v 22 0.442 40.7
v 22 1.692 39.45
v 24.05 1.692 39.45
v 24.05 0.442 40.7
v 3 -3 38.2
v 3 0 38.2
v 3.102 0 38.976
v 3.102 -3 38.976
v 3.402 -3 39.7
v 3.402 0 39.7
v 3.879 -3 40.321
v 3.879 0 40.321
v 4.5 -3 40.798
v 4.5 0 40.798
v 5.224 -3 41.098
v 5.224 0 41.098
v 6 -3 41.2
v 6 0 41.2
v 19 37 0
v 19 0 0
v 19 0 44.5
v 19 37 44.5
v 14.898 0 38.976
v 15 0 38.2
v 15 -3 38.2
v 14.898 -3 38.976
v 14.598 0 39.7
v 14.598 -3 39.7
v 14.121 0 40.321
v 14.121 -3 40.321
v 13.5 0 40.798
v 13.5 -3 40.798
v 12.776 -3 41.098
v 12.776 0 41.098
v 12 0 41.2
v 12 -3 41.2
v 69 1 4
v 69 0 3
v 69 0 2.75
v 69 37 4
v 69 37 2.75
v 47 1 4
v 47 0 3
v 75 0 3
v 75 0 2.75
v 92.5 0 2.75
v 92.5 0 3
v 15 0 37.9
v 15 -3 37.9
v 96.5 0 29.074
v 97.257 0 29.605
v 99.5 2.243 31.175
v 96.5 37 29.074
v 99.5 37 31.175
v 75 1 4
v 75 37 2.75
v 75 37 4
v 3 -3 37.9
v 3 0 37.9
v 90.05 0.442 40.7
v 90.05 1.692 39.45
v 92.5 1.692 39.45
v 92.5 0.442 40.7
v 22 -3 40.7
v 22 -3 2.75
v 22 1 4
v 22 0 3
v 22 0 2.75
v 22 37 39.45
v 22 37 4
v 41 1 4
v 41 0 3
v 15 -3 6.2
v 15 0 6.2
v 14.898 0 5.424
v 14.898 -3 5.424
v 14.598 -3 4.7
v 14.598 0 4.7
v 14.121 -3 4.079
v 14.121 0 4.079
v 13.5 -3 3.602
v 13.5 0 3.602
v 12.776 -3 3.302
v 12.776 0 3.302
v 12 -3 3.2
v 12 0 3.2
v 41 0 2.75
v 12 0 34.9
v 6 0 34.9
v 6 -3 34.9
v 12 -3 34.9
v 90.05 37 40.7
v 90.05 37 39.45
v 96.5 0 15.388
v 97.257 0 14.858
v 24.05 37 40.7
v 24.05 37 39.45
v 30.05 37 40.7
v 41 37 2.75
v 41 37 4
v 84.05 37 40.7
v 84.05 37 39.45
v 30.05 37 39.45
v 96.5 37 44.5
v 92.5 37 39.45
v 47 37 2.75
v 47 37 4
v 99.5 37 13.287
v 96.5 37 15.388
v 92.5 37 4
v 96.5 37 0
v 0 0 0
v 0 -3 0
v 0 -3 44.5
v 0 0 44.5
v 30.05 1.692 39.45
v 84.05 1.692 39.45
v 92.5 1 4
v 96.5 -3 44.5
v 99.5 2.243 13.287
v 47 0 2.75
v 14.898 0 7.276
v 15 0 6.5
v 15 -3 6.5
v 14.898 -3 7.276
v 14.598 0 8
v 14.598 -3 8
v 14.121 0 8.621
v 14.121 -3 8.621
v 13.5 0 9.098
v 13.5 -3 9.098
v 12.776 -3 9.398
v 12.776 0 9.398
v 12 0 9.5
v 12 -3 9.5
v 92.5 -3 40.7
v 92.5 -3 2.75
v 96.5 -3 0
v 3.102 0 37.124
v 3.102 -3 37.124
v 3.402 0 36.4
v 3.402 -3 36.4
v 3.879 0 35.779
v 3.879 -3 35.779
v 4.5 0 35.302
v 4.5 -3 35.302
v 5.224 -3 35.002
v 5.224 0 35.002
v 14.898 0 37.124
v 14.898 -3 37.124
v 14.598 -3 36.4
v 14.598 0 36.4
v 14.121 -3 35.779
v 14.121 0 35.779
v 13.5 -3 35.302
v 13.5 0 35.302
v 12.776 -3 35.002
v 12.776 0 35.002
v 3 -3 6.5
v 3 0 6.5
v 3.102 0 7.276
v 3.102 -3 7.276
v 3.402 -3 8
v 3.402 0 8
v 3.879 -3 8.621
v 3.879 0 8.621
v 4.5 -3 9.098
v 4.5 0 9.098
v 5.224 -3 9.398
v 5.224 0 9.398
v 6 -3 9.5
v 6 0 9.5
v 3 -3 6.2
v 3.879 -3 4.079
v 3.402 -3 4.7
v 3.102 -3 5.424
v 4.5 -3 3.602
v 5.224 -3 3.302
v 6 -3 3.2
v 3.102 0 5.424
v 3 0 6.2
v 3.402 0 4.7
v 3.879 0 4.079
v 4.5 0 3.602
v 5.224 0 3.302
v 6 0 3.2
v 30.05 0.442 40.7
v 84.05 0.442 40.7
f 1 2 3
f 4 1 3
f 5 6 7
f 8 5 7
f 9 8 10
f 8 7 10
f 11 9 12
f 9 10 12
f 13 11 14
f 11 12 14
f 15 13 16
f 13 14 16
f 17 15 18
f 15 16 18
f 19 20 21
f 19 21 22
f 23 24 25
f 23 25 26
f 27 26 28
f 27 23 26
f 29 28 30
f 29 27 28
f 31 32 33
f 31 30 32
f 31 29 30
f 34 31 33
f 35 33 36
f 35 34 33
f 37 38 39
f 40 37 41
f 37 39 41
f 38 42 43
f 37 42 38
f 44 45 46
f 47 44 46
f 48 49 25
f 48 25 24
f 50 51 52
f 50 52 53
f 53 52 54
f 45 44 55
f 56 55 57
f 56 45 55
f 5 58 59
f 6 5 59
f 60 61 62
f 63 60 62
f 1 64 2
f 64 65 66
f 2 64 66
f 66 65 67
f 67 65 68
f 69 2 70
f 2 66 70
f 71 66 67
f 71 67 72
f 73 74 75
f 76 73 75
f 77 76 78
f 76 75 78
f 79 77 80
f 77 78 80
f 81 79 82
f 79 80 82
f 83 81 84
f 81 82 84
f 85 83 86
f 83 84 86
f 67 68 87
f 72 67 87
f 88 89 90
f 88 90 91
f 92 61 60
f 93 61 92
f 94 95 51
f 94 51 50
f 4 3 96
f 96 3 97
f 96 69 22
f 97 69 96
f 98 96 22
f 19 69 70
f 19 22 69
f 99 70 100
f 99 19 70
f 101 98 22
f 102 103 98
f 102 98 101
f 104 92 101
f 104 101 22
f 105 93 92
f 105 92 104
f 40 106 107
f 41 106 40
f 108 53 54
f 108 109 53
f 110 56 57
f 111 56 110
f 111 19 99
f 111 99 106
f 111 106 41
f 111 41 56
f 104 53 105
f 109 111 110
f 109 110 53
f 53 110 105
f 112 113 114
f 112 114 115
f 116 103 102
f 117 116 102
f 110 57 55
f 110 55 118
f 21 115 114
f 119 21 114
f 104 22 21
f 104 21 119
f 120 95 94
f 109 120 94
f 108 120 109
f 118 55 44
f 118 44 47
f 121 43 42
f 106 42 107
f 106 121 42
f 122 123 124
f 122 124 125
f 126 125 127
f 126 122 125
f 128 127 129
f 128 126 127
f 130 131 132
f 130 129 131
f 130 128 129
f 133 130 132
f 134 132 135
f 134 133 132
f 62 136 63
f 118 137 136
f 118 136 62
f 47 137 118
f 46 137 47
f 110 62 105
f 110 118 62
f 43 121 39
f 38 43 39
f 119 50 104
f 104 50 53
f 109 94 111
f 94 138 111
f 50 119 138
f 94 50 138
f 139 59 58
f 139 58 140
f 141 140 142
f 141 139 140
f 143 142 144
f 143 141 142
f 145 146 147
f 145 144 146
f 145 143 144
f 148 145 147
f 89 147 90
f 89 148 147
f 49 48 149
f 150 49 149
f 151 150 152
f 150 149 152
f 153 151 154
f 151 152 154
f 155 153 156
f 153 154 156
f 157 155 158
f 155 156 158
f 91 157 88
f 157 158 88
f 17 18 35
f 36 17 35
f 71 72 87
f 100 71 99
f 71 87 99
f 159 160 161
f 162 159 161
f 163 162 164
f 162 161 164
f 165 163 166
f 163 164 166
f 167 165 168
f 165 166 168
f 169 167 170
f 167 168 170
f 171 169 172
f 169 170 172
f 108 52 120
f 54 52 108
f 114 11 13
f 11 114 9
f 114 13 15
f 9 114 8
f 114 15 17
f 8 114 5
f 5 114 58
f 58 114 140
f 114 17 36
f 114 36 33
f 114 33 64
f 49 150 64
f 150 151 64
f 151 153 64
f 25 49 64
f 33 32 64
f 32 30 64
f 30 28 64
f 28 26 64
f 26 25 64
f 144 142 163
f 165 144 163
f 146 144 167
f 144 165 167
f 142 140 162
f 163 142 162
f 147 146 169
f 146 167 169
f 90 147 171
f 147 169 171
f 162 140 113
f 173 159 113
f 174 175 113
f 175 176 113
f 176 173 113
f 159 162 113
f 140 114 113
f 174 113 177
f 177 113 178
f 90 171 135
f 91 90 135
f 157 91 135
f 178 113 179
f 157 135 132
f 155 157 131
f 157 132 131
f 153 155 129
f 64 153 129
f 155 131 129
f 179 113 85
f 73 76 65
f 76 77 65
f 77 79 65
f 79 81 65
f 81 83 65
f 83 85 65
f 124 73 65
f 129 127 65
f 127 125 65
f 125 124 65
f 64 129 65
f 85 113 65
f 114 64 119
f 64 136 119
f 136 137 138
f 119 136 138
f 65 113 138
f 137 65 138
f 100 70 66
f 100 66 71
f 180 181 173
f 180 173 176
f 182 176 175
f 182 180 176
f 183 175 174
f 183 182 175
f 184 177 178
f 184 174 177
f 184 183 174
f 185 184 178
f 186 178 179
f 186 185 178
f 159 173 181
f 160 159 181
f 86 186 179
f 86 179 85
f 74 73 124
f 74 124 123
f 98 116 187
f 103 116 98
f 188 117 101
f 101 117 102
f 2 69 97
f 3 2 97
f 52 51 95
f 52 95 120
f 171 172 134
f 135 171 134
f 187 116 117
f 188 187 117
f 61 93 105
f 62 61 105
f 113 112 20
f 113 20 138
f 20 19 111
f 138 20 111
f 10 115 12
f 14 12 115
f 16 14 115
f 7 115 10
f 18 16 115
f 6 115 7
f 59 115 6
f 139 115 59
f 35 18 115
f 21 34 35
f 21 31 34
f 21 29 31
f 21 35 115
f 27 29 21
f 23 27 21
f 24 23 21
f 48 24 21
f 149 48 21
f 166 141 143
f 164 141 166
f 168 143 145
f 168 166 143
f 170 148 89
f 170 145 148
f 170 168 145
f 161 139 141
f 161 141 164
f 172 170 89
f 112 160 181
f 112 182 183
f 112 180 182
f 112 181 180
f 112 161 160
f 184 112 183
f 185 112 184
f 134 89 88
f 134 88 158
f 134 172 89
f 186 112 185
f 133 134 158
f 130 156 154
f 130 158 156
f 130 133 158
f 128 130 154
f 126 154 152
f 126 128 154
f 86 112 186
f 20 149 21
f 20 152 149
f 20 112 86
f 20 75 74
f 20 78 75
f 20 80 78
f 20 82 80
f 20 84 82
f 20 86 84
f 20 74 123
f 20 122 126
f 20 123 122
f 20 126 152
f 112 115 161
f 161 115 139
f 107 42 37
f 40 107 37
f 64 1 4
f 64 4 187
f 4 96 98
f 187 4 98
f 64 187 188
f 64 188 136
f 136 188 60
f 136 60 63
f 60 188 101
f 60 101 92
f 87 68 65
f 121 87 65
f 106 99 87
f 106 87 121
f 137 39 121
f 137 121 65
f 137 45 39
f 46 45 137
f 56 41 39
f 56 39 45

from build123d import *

# Parameters (mm, degrees)
BOX027_W               = 71
BOX027_H               = 10
BOX027_DEPTH           = 10
BOX027_PLACEMENT_ANGLE = 45
BOX022_W               = 22
BOX022_H               = 37
BOX022_DEPTH           = 4
BOX023_W               = 18
BOX023_H               = 37
BOX023_DEPTH           = 4
BOX021_W               = 19
BOX021_H               = 37
BOX021_DEPTH           = 4
BOX028_W               = 80
BOX028_H               = 10
BOX028_DEPTH           = 10
BOX028_PLACEMENT_ANGLE = 315
BOX025_W               = 3
BOX025_H               = 37
BOX025_DEPTH           = 4
BOX026_W               = 4
BOX026_H               = 37
BOX026_DEPTH           = 4
BOX024_W               = 54
BOX024_H               = 37
BOX024_DEPTH           = 4
BOX019_W               = 12
BOX019_H               = 10
BOX019_DEPTH           = 6.3
FILLET_R               = 3
BOX020_W               = 12
BOX020_H               = 10
BOX020_DEPTH           = 6.3
FILLET001_R            = 3
BOX018_W               = 19
BOX018_H               = 37
BOX018_DEPTH           = 45
BOX017_W               = 70.5
BOX017_H               = 45
BOX017_DEPTH           = 37.95
BOX016_W               = 96.5
BOX016_H               = 40
BOX016_DEPTH           = 44.5
BOX013_W               = 3
BOX013_H               = 37
BOX013_DEPTH           = 17.92
BOX013_PLACEMENT_ANGLE = 45
BOX014_W               = 3
BOX014_H               = 37
BOX014_DEPTH           = 17.92
BOX014_PLACEMENT_ANGLE = 55
BOX015_W               = 3
BOX015_H               = 37
BOX015_DEPTH           = 17.92
BOX015_PLACEMENT_ANGLE = 125
BOX012_W               = 3
BOX012_H               = 37
BOX012_DEPTH           = 17.92
CUT007_PLACEMENT_ANGLE = 180


with BuildPart() as cube027:
    # Box027 → Box027 (new body)
    with BuildSketch(Plane.XY):
        with Locations((35.5, 5)):
            Rectangle(BOX027_W, BOX027_H)
    extrude(amount=BOX027_DEPTH)


with BuildPart() as cube027_1:
    # Box027 placement: moved
    add(cube027.part.moved(Location((22, -3, 0))).rotate(Axis((22, -3, 0), (1, 0, 0)), BOX027_PLACEMENT_ANGLE))


with BuildPart() as cube022:
    # Box022 → Box022 (new body)
    with BuildSketch(Plane(origin=(47, 0, 0), x_dir=(1, 0, 0), z_dir=(0, 0, 1))):
        with Locations((11, 18.5)):
            Rectangle(BOX022_W, BOX022_H)
    extrude(amount=BOX022_DEPTH)


with BuildPart() as cube023:
    # Box023 → Box023 (new body)
    with BuildSketch(Plane(origin=(75, 0, 0), x_dir=(1, 0, 0), z_dir=(0, 0, 1))):
        with Locations((9, 18.5)):
            Rectangle(BOX023_W, BOX023_H)
    extrude(amount=BOX023_DEPTH)


with BuildPart() as cut010:
    # Box021 → Box021 (new body)
    with BuildSketch(Plane(origin=(22, 0, 0), x_dir=(1, 0, 0), z_dir=(0, 0, 1))):
        with Locations((9.5, 18.5)):
            Rectangle(BOX021_W, BOX021_H)
    extrude(amount=BOX021_DEPTH)

    # Fusion005: union Cube022, Cube023
    add(cube022.part)
    add(cube023.part)

    # Cut010: cut Cube027
    add(cube027_1.part, mode=Mode.SUBTRACT)


with BuildPart() as cube028:
    # Box028 → Box028 (new body)
    with BuildSketch(Plane.XY):
        with Locations((40, 5)):
            Rectangle(BOX028_W, BOX028_H)
    extrude(amount=BOX028_DEPTH)


with BuildPart() as cube028_1:
    # Box028 placement: moved
    add(cube028.part.moved(Location((13, -8, 35))).rotate(Axis((13, -8, 35), (1, 0, 0)), BOX028_PLACEMENT_ANGLE))


with BuildPart() as cube025:
    # Box025 → Box025 (new body)
    with BuildSketch(Plane(origin=(21.05, 0, 39.45), x_dir=(1, 0, 0), z_dir=(0, 0, 1))):
        with Locations((1.5, 18.5)):
            Rectangle(BOX025_W, BOX025_H)
    extrude(amount=BOX025_DEPTH)


with BuildPart() as cube026:
    # Box026 → Box026 (new body)
    with BuildSketch(Plane(origin=(90.05, 0, 39.45), x_dir=(1, 0, 0), z_dir=(0, 0, 1))):
        with Locations((2, 18.5)):
            Rectangle(BOX026_W, BOX026_H)
    extrude(amount=BOX026_DEPTH)


with BuildPart() as cut011:
    # Box024 → Box024 (new body)
    with BuildSketch(Plane(origin=(30.05, 0, 39.45), x_dir=(1, 0, 0), z_dir=(0, 0, 1))):
        with Locations((27, 18.5)):
            Rectangle(BOX024_W, BOX024_H)
    extrude(amount=BOX024_DEPTH)

    # Fusion006: union Cube025, Cube026
    add(cube025.part)
    add(cube026.part)

    # Cut011: cut Cube028
    add(cube028_1.part, mode=Mode.SUBTRACT)


with BuildPart() as fillet_body:
    # Box019 → Box019 (new body)
    with BuildSketch(Plane(origin=(3, -3, 3.2), x_dir=(1, 0, 0), z_dir=(0, 0, 1))):
        with Locations((6, 5)):
            Rectangle(BOX019_W, BOX019_H)
    extrude(amount=BOX019_DEPTH)

    # Fillet
    fillet_edges = [fillet_body.edges().sort_by_distance(p)[0] for p in [
        (3, 2, 9.5),
        (3, 2, 3.2),
        (15, 2, 9.5),
        (15, 2, 3.2),
    ]]
    fillet(fillet_edges, radius=FILLET_R)


with BuildPart() as fillet_body_1:
    # Fillet placement: moved
    add(fillet_body.part.moved(Location((0, -1, 0))))


with BuildPart() as fillet001:
    # Box020 → Box020 (new body)
    with BuildSketch(Plane(origin=(3, -3, 3.2), x_dir=(1, 0, 0), z_dir=(0, 0, 1))):
        with Locations((6, 5)):
            Rectangle(BOX020_W, BOX020_H)
    extrude(amount=BOX020_DEPTH)

    # Fillet001
    fillet001_edges = [fillet001.edges().sort_by_distance(p)[0] for p in [
        (3, 2, 9.5),
        (3, 2, 3.2),
        (15, 2, 9.5),
        (15, 2, 3.2),
    ]]
    fillet(fillet001_edges, radius=FILLET001_R)


with BuildPart() as fillet001_1:
    # Fillet001 placement: moved
    add(fillet001.part.moved(Location((0, -1, 31.7))))


with BuildPart() as fusion004:
    # Box018 → Box018 (new body)
    with BuildSketch(Plane.XY):
        with Locations((9.5, 18.5)):
            Rectangle(BOX018_W, BOX018_H)
    extrude(amount=BOX018_DEPTH)

    # Fusion004: union Fillet body, Fillet001
    add(fillet_body_1.part)
    add(fillet001_1.part)


with BuildPart() as cube017:
    # Box017 → Box017 (new body)
    with BuildSketch(Plane(origin=(22, -4, 2.75), x_dir=(1, 0, 0), z_dir=(0, 0, 1))):
        with Locations((35.25, 22.5)):
            Rectangle(BOX017_W, BOX017_H)
    extrude(amount=BOX017_DEPTH)


with BuildPart() as cube016:
    # Box016 → Box016 (new body)
    with BuildSketch(Plane(origin=(0, -3, 0), x_dir=(1, 0, 0), z_dir=(0, 0, 1))):
        with Locations((48.25, 20)):
            Rectangle(BOX016_W, BOX016_H)
    extrude(amount=BOX016_DEPTH)


with BuildPart() as cube013:
    # Box013 → Box013 (new body)
    with BuildSketch(Plane.XY):
        with Locations((1.5, 18.5)):
            Rectangle(BOX013_W, BOX013_H)
    extrude(amount=BOX013_DEPTH)


with BuildPart() as cube013_1:
    # Box013 placement: moved
    add(cube013.part.moved(Location((314.75, -3, 13.25))).rotate(Axis((314.75, -3, 13.25), (0, 0, 1)), BOX013_PLACEMENT_ANGLE))


with BuildPart() as cube014:
    # Box014 → Box014 (new body)
    with BuildSketch(Plane.XY):
        with Locations((1.5, 18.5)):
            Rectangle(BOX014_W, BOX014_H)
    extrude(amount=BOX014_DEPTH)


with BuildPart() as cube014_1:
    # Box014 placement: moved
    add(cube014.part.moved(Location((313, 0, 12.75))).rotate(Axis((313, 0, 12.75), (0, 1, 0)), BOX014_PLACEMENT_ANGLE))


with BuildPart() as fusion002:
    # Box015 → Box015 (new body)
    with BuildSketch(Plane.XY):
        with Locations((1.5, 18.5)):
            Rectangle(BOX015_W, BOX015_H)
    extrude(amount=BOX015_DEPTH)


with BuildPart() as fusion002_1:
    # Box015 placement: moved
    add(fusion002.part.moved(Location((313, 0, 35.35))).rotate(Axis((313, 0, 35.35), (0, 1, 0)), BOX015_PLACEMENT_ANGLE))

    # Fusion002: union Cube014
    add(cube014_1.part)


with BuildPart() as rack_left_side_shorter:
    # Box012 → Box012 (new body)
    with BuildSketch(Plane(origin=(313.75, 0, 13.25), x_dir=(1, 0, 0), z_dir=(0, 0, 1))):
        with Locations((1.5, 18.5)):
            Rectangle(BOX012_W, BOX012_H)
    extrude(amount=BOX012_DEPTH)

    # Cut006: cut Fusion002
    add(fusion002_1.part, mode=Mode.SUBTRACT)

    # Cut007: cut Cube013
    add(cube013_1.part, mode=Mode.SUBTRACT)


with BuildPart() as rack_left_side_shorter_1:
    # Cut007 placement: moved
    add(rack_left_side_shorter.part.moved(Location((413.25, 0, 44.45))).rotate(Axis((413.25, 0, 44.45), (0, 1, 0)), CUT007_PLACEMENT_ANGLE))

    # Fusion003: union Cube016
    add(cube016.part)

    # Cut008: cut Cube017
    add(cube017.part, mode=Mode.SUBTRACT)

    # Cut009: cut Fusion004
    add(fusion004.part, mode=Mode.SUBTRACT)

    # Fusion007: union Cut010, Cut011
    add(cut010.part)
    add(cut011.part)


solid = rack_left_side_shorter_1.part
